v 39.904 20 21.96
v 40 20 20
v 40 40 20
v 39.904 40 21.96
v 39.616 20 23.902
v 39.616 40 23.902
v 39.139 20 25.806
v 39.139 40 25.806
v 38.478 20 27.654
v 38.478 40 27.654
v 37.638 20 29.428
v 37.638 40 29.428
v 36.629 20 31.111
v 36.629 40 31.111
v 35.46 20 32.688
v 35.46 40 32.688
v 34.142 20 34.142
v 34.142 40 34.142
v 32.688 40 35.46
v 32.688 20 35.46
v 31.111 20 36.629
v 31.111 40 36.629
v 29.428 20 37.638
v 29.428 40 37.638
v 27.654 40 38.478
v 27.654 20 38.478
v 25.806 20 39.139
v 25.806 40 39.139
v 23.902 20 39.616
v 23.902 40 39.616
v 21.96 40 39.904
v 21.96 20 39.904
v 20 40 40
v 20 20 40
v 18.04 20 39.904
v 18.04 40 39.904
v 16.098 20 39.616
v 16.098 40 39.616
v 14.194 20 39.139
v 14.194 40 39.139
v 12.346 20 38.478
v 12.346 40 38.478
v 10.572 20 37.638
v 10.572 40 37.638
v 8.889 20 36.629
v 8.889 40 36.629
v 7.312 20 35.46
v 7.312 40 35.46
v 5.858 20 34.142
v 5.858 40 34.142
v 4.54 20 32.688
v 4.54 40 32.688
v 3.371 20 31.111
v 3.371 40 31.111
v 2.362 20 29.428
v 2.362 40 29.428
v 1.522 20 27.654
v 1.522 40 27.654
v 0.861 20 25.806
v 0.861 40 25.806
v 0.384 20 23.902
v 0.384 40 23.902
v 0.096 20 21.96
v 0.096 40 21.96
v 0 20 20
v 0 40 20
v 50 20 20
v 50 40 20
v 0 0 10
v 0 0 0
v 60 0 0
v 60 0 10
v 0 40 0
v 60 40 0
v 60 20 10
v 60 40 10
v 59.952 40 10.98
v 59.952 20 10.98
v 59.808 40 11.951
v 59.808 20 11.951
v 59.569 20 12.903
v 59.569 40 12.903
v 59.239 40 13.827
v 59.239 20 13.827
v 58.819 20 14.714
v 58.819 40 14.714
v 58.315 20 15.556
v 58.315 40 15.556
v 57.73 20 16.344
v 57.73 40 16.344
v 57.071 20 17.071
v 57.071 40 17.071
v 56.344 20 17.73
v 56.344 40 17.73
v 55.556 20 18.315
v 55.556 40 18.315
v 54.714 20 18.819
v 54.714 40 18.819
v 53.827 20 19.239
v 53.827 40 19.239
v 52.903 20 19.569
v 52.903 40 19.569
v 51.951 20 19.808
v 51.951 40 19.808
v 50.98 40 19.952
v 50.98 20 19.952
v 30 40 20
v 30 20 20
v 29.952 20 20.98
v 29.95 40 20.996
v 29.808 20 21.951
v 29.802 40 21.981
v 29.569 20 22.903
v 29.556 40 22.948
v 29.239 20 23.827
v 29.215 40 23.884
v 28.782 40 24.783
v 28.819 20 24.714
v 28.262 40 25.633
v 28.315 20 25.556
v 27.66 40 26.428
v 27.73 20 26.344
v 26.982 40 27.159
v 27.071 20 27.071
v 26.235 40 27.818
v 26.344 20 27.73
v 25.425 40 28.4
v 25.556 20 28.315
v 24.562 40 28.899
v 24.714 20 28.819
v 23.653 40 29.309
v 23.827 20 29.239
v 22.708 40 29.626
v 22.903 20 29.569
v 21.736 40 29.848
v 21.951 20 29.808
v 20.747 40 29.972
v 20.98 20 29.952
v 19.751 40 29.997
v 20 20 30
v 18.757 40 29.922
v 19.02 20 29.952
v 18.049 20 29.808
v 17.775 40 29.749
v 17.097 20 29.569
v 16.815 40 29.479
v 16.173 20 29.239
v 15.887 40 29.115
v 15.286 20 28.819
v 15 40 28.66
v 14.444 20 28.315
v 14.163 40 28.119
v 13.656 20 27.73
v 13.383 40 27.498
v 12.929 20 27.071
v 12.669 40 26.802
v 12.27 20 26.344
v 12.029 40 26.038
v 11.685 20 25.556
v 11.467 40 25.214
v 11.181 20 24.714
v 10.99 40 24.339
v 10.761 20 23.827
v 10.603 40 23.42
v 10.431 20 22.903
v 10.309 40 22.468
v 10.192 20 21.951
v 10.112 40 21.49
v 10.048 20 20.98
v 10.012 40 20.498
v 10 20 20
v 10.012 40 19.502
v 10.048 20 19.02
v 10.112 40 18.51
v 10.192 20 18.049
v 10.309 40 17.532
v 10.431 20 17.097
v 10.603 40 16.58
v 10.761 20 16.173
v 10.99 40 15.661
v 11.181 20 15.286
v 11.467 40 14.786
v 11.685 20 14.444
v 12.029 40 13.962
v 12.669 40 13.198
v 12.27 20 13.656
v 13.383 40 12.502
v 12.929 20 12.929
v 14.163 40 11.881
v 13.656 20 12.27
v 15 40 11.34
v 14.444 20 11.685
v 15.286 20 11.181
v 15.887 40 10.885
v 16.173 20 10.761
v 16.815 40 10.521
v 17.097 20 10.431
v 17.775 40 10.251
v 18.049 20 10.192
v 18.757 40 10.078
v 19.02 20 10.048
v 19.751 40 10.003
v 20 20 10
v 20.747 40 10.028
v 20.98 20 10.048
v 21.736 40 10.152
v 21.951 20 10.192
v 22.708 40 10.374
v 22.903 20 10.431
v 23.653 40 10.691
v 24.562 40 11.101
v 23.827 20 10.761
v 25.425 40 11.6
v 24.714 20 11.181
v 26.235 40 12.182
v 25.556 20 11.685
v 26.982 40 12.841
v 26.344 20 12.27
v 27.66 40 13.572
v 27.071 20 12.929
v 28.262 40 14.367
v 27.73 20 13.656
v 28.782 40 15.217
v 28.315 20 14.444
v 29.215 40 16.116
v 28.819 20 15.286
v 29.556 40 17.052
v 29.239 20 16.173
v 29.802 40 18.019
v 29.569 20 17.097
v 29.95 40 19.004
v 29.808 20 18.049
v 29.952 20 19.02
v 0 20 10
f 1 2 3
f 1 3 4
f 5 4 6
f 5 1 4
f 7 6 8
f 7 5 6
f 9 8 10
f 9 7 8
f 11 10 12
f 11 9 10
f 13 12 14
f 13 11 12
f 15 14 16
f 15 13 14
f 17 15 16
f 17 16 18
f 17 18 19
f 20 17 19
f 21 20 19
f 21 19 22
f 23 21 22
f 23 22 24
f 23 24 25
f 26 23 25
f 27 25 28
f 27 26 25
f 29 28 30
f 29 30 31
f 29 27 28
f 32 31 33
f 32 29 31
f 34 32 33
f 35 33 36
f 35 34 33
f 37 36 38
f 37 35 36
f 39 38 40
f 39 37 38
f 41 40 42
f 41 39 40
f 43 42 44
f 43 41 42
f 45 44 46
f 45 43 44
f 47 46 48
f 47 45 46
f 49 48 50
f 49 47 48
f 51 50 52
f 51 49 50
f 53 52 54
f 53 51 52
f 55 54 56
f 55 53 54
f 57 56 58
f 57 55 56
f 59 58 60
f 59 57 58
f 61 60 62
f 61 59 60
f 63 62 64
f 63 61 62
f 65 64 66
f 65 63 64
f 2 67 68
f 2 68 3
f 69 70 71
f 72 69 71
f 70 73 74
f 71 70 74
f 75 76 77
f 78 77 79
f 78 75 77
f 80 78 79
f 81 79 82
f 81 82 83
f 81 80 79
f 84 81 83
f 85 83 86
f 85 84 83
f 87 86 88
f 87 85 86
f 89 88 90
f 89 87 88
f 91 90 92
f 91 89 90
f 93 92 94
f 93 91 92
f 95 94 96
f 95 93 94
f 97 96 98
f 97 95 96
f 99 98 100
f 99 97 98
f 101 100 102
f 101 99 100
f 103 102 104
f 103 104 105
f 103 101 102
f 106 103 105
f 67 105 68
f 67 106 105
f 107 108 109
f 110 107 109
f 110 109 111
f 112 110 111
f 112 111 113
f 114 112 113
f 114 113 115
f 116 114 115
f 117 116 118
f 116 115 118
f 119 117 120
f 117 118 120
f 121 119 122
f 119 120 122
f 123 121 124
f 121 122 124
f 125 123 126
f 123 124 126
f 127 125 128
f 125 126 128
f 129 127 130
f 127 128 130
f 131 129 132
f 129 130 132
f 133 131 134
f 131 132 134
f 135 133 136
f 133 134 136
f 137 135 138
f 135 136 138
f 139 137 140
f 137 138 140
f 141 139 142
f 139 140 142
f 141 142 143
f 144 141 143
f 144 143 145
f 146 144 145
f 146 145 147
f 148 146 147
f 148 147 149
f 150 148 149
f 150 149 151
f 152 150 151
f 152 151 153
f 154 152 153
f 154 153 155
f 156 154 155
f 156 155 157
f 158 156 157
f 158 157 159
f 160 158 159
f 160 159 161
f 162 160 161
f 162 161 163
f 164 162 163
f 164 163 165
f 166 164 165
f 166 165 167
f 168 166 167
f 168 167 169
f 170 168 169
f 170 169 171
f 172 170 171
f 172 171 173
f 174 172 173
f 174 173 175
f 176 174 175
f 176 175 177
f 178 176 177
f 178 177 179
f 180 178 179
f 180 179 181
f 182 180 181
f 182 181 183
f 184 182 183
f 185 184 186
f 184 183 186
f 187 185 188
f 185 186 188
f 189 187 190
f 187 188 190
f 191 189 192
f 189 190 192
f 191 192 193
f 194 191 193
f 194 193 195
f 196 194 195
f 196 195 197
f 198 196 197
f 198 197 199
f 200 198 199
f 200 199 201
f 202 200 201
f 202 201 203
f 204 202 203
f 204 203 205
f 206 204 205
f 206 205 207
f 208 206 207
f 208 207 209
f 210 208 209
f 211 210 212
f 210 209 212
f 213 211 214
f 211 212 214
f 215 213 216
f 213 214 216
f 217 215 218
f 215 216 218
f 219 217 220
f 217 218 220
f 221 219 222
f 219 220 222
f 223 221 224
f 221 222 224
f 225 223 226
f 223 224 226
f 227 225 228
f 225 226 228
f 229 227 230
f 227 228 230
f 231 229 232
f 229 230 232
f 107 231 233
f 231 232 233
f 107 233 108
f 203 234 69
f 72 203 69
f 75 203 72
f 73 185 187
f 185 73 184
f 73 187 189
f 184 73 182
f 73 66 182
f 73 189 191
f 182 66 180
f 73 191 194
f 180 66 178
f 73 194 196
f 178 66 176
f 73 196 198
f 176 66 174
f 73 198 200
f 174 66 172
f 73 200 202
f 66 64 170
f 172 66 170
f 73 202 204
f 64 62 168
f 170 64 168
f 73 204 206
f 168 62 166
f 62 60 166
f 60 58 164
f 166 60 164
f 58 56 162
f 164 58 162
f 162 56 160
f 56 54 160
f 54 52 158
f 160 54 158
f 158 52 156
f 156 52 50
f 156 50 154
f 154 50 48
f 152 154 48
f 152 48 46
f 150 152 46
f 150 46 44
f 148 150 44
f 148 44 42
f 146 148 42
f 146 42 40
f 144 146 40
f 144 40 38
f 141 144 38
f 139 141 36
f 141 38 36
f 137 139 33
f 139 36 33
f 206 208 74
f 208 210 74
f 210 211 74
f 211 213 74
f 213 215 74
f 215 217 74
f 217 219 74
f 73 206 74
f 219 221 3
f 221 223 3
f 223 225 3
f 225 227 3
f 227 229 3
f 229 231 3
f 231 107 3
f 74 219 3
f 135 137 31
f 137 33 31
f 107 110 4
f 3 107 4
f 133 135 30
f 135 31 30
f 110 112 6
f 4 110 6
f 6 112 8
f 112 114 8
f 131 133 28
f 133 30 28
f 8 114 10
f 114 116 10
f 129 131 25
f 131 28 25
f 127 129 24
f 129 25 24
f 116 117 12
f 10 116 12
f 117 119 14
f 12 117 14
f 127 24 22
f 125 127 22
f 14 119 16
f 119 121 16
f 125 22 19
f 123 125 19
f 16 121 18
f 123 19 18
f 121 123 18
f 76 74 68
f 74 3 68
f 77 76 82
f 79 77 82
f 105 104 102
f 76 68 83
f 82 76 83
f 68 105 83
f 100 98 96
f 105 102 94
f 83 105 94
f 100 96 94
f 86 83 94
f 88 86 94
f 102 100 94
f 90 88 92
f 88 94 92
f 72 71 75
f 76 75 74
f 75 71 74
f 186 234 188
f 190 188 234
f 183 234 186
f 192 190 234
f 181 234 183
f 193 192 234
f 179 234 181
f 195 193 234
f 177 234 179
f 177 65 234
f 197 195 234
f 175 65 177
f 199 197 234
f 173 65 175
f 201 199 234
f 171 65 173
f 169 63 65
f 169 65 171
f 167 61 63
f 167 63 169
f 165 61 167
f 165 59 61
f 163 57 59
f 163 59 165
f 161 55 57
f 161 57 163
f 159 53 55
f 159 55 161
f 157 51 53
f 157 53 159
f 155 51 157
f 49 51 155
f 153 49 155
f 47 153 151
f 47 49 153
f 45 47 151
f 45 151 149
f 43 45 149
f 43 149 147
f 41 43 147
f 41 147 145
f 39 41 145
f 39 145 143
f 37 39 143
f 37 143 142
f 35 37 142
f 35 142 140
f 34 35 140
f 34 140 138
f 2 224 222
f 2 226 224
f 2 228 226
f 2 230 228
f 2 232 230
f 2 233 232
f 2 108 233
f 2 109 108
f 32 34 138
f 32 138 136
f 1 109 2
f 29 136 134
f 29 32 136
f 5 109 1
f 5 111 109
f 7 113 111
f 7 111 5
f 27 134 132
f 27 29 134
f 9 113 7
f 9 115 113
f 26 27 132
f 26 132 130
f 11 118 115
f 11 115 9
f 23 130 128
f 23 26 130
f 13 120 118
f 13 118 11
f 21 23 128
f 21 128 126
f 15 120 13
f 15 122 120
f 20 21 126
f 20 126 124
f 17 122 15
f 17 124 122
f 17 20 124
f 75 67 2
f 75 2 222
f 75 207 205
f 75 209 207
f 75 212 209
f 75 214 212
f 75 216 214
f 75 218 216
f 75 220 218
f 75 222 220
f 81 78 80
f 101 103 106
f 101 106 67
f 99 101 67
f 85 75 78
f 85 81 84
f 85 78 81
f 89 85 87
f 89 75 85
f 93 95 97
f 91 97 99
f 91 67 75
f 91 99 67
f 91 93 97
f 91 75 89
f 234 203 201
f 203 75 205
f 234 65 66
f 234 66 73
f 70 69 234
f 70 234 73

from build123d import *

# Parameters (mm, degrees)
F0_W     = 60
F0_H     = 40
F1_DEPTH = 10
F3_START = -20
F3_DEPTH = 20
F4_R     = 10
F5_DEPTH = 25


with BuildPart() as f1:
    # F0 (on Top) → F1 (new body)
    with BuildSketch(Plane.XY):
        with Locations((30, 20)):
            Rectangle(F0_W, F0_H)
    extrude(amount=F1_DEPTH)

    # F2 (on Front) → F3 (join)
    with BuildSketch(Plane.XZ.offset(F3_START)):
        with BuildLine():
            Line((50, 20), (40, 20))
            ThreePointArc((40, 20), (20, 40), (0, 20))
            Line((0, 20), (0, 10))
            Line((0, 10), (60, 10))
            ThreePointArc((60, 10), (57.0710678119, 17.0710678119), (50, 20))
        make_face()
    extrude(amount=-F3_DEPTH)

    # F4 (on face) → F5 (cut)
    with BuildSketch(Plane.XZ.offset(-20)):
        with Locations((20, 20)):
            Circle(F4_R)
    extrude(amount=-F5_DEPTH, mode=Mode.SUBTRACT)


solid = f1.part
